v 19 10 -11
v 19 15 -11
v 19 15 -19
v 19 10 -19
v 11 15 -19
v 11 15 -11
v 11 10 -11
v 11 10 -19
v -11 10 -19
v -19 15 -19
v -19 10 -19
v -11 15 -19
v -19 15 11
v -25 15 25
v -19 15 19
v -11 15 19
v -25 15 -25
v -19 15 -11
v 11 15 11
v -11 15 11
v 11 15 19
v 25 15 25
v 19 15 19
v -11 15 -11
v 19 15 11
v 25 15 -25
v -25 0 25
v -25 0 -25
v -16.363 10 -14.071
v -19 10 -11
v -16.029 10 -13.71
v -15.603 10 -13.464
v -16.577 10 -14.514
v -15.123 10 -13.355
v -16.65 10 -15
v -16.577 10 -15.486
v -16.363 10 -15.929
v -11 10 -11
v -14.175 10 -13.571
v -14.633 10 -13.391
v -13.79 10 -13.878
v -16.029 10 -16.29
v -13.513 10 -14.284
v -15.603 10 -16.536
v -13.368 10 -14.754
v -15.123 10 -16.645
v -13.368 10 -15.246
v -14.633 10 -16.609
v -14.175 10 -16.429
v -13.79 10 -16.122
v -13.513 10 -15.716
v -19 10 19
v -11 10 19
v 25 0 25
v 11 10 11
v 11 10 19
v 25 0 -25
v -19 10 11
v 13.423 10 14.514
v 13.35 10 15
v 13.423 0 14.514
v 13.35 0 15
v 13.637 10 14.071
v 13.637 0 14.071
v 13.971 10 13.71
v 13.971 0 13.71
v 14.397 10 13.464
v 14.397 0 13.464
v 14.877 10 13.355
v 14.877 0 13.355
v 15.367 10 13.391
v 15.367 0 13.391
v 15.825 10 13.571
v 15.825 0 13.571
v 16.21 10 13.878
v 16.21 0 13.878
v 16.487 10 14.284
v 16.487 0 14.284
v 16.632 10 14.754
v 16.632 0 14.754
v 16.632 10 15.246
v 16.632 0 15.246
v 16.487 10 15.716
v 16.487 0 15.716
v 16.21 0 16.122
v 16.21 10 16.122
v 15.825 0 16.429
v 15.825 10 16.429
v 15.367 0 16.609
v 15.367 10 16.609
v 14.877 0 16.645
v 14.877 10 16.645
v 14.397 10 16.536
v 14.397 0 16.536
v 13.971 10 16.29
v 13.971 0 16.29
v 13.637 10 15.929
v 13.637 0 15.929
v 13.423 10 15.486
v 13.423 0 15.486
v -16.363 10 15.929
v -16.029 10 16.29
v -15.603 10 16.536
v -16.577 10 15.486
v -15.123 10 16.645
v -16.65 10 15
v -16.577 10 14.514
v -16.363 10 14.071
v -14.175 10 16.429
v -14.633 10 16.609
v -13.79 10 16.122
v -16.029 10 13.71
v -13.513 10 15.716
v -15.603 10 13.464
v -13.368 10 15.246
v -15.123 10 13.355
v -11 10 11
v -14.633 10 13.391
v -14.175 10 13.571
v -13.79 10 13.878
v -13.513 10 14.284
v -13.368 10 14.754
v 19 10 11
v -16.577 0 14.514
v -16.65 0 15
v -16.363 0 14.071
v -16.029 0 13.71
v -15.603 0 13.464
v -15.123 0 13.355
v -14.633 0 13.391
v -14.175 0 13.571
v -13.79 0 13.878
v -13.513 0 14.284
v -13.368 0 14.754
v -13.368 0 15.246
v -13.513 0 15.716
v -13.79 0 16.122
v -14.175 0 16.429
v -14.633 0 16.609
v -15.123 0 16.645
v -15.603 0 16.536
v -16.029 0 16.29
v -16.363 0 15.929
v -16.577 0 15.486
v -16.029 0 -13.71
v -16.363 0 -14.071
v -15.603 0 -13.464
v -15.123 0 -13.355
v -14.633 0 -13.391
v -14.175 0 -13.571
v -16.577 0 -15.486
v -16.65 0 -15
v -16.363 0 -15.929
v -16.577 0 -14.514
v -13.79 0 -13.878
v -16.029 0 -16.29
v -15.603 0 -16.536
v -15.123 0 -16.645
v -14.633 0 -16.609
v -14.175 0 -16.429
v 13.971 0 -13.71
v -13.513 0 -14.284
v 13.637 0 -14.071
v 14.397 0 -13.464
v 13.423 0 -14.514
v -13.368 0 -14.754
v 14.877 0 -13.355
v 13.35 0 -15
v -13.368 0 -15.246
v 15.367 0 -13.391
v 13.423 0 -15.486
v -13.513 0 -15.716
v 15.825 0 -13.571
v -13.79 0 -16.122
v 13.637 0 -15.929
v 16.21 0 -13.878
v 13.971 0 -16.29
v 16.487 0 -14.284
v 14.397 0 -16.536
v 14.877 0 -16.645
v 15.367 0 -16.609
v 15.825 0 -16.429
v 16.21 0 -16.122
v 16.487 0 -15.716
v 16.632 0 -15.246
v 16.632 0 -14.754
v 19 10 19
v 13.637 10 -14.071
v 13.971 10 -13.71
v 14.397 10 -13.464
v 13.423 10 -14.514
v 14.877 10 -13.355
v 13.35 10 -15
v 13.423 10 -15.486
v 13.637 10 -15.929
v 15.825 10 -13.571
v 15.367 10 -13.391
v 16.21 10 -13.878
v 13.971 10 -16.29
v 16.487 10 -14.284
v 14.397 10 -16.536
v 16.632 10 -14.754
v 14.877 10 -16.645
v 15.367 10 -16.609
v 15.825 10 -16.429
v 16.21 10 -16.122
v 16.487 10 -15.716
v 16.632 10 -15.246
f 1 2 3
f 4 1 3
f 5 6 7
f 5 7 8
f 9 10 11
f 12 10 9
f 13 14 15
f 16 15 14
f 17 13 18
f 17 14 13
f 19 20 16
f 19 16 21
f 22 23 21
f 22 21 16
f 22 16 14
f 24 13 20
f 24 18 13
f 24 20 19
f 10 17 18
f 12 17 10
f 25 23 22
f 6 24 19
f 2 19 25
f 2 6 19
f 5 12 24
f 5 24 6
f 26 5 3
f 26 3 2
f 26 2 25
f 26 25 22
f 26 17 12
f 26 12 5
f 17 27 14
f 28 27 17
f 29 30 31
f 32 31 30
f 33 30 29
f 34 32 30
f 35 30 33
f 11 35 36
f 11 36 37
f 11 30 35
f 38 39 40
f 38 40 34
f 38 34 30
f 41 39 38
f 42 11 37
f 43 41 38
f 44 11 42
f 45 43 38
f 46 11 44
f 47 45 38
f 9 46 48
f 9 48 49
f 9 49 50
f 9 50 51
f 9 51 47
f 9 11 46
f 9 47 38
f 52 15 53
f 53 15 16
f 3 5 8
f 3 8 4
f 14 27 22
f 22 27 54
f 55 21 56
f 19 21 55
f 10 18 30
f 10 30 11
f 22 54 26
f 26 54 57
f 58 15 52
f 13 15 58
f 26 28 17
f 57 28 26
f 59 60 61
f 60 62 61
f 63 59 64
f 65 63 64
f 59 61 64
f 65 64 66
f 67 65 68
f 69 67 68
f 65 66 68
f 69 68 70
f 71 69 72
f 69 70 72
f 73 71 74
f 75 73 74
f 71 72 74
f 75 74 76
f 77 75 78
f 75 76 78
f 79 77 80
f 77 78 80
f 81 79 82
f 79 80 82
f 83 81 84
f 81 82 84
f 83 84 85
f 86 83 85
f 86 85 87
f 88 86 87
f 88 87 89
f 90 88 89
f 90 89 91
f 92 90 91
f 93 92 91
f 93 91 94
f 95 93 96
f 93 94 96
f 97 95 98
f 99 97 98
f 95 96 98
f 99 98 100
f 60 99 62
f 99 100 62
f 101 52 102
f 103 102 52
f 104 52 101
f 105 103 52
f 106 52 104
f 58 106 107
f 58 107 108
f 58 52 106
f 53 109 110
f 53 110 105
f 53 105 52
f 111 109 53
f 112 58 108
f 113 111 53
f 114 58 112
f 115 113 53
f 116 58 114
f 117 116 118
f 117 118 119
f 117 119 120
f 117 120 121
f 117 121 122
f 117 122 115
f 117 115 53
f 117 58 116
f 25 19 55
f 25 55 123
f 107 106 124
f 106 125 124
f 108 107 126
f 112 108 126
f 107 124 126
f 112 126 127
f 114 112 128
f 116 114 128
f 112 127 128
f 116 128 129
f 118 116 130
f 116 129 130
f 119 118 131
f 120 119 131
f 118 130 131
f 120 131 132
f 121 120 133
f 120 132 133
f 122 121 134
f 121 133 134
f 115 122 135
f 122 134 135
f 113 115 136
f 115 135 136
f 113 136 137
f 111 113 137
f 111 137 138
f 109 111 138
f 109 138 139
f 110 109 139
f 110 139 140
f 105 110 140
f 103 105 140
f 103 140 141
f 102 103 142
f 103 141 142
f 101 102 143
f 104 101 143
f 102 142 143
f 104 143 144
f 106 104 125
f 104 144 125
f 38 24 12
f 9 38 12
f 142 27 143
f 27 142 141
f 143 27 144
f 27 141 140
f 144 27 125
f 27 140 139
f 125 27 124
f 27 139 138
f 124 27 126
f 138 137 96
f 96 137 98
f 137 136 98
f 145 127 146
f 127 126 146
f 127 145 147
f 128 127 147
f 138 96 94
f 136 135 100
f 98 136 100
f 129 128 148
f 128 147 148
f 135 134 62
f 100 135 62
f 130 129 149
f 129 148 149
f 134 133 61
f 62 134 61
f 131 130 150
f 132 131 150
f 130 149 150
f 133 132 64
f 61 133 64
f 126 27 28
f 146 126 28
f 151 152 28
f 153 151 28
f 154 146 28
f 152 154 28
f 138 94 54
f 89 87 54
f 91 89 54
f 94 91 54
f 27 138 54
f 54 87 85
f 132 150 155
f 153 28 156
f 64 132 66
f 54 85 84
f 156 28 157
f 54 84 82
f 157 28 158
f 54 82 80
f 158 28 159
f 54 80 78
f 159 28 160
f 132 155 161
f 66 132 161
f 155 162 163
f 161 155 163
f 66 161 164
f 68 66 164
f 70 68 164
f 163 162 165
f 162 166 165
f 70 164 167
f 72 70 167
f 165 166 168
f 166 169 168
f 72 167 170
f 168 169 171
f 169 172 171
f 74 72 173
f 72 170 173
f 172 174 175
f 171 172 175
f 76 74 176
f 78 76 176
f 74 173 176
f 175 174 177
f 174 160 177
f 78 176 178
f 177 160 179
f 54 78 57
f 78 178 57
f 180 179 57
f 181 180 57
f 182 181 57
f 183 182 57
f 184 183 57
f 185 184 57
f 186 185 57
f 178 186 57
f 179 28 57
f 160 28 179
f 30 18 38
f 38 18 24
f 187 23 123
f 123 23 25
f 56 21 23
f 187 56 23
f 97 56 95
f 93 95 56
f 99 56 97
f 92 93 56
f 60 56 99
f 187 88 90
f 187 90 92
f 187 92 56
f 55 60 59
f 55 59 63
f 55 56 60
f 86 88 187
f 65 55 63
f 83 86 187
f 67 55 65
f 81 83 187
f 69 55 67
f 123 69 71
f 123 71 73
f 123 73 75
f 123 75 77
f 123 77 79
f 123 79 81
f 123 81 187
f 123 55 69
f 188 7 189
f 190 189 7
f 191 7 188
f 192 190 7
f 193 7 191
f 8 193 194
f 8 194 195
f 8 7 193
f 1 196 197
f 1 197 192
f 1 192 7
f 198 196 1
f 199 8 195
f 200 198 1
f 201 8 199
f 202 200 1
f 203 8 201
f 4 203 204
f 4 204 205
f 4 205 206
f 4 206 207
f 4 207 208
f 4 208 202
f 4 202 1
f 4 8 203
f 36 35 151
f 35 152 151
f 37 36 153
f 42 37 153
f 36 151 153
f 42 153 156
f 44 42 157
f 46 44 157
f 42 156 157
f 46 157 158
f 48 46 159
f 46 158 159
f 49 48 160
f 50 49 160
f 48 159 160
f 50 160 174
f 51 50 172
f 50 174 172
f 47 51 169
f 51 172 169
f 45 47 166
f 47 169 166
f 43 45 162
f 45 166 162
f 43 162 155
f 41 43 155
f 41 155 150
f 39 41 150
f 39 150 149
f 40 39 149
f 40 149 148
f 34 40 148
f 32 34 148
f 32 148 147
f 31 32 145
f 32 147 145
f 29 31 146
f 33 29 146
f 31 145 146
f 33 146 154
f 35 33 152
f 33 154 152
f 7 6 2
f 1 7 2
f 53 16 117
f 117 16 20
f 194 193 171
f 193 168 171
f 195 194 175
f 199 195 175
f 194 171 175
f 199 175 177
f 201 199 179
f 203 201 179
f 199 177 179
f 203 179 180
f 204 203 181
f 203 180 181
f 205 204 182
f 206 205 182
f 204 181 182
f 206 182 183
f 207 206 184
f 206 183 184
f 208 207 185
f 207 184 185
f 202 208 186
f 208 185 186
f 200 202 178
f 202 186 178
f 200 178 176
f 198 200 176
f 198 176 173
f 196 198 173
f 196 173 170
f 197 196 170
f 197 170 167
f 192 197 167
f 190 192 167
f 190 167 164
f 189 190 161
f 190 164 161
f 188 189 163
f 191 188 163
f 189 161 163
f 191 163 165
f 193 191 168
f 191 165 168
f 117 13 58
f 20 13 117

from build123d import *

# Parameters (mm, degrees)
SKETCH1_W                             = 50
SKETCH1_H                             = 50
BOSS_EXTRUDE1_DEPTH                   = 15
TAP_DRILL_FOR_M4X0_7_TAP1_D           = 3.3
TAP_DRILL_FOR_M4X0_7_TAP1_CSINK_D     = 3.35
TAP_DRILL_FOR_M4X0_7_TAP1_CSINK_ANGLE = 90
SKETCH3_W                             = 8
SKETCH3_H                             = 8
CUT_EXTRUDE2_DEPTH                    = 5


with BuildPart() as part:
    # Sketch1 → Boss-Extrude1 (new body)
    with BuildSketch(Plane(origin=(0, 0, 0), x_dir=(1, 0, 0), z_dir=(0, 1, 0))):
        Rectangle(SKETCH1_W, SKETCH1_H)
    extrude(amount=BOSS_EXTRUDE1_DEPTH)

    # Tap Drill for M4x0.7 Tap1 (through all)
    with Locations(Plane(origin=(0, 15, 0), x_dir=(1, 0, 0), z_dir=(0, 1, 0))):
        with Locations((-15, 15), (15, 15), (15, -15), (-15, -15)):
            CounterSinkHole(TAP_DRILL_FOR_M4X0_7_TAP1_D / 2, TAP_DRILL_FOR_M4X0_7_TAP1_CSINK_D / 2, counter_sink_angle=TAP_DRILL_FOR_M4X0_7_TAP1_CSINK_ANGLE)

    # Sketch3 → Cut-Extrude2 (cut)
    with BuildSketch(Plane(origin=(0, 15, 0), x_dir=(1, 0, 0), z_dir=(0, 1, 0))):
        with Locations((15, 15)):
            Rectangle(SKETCH3_W, SKETCH3_H)
        with Locations((-15, 15)):
            Rectangle(SKETCH3_W, SKETCH3_H)
        with Locations((-15, -15)):
            Rectangle(SKETCH3_W, SKETCH3_H)
        with Locations((15, -15)):
            Rectangle(SKETCH3_W, SKETCH3_H)
    extrude(amount=-CUT_EXTRUDE2_DEPTH, mode=Mode.SUBTRACT)


solid = part.part
